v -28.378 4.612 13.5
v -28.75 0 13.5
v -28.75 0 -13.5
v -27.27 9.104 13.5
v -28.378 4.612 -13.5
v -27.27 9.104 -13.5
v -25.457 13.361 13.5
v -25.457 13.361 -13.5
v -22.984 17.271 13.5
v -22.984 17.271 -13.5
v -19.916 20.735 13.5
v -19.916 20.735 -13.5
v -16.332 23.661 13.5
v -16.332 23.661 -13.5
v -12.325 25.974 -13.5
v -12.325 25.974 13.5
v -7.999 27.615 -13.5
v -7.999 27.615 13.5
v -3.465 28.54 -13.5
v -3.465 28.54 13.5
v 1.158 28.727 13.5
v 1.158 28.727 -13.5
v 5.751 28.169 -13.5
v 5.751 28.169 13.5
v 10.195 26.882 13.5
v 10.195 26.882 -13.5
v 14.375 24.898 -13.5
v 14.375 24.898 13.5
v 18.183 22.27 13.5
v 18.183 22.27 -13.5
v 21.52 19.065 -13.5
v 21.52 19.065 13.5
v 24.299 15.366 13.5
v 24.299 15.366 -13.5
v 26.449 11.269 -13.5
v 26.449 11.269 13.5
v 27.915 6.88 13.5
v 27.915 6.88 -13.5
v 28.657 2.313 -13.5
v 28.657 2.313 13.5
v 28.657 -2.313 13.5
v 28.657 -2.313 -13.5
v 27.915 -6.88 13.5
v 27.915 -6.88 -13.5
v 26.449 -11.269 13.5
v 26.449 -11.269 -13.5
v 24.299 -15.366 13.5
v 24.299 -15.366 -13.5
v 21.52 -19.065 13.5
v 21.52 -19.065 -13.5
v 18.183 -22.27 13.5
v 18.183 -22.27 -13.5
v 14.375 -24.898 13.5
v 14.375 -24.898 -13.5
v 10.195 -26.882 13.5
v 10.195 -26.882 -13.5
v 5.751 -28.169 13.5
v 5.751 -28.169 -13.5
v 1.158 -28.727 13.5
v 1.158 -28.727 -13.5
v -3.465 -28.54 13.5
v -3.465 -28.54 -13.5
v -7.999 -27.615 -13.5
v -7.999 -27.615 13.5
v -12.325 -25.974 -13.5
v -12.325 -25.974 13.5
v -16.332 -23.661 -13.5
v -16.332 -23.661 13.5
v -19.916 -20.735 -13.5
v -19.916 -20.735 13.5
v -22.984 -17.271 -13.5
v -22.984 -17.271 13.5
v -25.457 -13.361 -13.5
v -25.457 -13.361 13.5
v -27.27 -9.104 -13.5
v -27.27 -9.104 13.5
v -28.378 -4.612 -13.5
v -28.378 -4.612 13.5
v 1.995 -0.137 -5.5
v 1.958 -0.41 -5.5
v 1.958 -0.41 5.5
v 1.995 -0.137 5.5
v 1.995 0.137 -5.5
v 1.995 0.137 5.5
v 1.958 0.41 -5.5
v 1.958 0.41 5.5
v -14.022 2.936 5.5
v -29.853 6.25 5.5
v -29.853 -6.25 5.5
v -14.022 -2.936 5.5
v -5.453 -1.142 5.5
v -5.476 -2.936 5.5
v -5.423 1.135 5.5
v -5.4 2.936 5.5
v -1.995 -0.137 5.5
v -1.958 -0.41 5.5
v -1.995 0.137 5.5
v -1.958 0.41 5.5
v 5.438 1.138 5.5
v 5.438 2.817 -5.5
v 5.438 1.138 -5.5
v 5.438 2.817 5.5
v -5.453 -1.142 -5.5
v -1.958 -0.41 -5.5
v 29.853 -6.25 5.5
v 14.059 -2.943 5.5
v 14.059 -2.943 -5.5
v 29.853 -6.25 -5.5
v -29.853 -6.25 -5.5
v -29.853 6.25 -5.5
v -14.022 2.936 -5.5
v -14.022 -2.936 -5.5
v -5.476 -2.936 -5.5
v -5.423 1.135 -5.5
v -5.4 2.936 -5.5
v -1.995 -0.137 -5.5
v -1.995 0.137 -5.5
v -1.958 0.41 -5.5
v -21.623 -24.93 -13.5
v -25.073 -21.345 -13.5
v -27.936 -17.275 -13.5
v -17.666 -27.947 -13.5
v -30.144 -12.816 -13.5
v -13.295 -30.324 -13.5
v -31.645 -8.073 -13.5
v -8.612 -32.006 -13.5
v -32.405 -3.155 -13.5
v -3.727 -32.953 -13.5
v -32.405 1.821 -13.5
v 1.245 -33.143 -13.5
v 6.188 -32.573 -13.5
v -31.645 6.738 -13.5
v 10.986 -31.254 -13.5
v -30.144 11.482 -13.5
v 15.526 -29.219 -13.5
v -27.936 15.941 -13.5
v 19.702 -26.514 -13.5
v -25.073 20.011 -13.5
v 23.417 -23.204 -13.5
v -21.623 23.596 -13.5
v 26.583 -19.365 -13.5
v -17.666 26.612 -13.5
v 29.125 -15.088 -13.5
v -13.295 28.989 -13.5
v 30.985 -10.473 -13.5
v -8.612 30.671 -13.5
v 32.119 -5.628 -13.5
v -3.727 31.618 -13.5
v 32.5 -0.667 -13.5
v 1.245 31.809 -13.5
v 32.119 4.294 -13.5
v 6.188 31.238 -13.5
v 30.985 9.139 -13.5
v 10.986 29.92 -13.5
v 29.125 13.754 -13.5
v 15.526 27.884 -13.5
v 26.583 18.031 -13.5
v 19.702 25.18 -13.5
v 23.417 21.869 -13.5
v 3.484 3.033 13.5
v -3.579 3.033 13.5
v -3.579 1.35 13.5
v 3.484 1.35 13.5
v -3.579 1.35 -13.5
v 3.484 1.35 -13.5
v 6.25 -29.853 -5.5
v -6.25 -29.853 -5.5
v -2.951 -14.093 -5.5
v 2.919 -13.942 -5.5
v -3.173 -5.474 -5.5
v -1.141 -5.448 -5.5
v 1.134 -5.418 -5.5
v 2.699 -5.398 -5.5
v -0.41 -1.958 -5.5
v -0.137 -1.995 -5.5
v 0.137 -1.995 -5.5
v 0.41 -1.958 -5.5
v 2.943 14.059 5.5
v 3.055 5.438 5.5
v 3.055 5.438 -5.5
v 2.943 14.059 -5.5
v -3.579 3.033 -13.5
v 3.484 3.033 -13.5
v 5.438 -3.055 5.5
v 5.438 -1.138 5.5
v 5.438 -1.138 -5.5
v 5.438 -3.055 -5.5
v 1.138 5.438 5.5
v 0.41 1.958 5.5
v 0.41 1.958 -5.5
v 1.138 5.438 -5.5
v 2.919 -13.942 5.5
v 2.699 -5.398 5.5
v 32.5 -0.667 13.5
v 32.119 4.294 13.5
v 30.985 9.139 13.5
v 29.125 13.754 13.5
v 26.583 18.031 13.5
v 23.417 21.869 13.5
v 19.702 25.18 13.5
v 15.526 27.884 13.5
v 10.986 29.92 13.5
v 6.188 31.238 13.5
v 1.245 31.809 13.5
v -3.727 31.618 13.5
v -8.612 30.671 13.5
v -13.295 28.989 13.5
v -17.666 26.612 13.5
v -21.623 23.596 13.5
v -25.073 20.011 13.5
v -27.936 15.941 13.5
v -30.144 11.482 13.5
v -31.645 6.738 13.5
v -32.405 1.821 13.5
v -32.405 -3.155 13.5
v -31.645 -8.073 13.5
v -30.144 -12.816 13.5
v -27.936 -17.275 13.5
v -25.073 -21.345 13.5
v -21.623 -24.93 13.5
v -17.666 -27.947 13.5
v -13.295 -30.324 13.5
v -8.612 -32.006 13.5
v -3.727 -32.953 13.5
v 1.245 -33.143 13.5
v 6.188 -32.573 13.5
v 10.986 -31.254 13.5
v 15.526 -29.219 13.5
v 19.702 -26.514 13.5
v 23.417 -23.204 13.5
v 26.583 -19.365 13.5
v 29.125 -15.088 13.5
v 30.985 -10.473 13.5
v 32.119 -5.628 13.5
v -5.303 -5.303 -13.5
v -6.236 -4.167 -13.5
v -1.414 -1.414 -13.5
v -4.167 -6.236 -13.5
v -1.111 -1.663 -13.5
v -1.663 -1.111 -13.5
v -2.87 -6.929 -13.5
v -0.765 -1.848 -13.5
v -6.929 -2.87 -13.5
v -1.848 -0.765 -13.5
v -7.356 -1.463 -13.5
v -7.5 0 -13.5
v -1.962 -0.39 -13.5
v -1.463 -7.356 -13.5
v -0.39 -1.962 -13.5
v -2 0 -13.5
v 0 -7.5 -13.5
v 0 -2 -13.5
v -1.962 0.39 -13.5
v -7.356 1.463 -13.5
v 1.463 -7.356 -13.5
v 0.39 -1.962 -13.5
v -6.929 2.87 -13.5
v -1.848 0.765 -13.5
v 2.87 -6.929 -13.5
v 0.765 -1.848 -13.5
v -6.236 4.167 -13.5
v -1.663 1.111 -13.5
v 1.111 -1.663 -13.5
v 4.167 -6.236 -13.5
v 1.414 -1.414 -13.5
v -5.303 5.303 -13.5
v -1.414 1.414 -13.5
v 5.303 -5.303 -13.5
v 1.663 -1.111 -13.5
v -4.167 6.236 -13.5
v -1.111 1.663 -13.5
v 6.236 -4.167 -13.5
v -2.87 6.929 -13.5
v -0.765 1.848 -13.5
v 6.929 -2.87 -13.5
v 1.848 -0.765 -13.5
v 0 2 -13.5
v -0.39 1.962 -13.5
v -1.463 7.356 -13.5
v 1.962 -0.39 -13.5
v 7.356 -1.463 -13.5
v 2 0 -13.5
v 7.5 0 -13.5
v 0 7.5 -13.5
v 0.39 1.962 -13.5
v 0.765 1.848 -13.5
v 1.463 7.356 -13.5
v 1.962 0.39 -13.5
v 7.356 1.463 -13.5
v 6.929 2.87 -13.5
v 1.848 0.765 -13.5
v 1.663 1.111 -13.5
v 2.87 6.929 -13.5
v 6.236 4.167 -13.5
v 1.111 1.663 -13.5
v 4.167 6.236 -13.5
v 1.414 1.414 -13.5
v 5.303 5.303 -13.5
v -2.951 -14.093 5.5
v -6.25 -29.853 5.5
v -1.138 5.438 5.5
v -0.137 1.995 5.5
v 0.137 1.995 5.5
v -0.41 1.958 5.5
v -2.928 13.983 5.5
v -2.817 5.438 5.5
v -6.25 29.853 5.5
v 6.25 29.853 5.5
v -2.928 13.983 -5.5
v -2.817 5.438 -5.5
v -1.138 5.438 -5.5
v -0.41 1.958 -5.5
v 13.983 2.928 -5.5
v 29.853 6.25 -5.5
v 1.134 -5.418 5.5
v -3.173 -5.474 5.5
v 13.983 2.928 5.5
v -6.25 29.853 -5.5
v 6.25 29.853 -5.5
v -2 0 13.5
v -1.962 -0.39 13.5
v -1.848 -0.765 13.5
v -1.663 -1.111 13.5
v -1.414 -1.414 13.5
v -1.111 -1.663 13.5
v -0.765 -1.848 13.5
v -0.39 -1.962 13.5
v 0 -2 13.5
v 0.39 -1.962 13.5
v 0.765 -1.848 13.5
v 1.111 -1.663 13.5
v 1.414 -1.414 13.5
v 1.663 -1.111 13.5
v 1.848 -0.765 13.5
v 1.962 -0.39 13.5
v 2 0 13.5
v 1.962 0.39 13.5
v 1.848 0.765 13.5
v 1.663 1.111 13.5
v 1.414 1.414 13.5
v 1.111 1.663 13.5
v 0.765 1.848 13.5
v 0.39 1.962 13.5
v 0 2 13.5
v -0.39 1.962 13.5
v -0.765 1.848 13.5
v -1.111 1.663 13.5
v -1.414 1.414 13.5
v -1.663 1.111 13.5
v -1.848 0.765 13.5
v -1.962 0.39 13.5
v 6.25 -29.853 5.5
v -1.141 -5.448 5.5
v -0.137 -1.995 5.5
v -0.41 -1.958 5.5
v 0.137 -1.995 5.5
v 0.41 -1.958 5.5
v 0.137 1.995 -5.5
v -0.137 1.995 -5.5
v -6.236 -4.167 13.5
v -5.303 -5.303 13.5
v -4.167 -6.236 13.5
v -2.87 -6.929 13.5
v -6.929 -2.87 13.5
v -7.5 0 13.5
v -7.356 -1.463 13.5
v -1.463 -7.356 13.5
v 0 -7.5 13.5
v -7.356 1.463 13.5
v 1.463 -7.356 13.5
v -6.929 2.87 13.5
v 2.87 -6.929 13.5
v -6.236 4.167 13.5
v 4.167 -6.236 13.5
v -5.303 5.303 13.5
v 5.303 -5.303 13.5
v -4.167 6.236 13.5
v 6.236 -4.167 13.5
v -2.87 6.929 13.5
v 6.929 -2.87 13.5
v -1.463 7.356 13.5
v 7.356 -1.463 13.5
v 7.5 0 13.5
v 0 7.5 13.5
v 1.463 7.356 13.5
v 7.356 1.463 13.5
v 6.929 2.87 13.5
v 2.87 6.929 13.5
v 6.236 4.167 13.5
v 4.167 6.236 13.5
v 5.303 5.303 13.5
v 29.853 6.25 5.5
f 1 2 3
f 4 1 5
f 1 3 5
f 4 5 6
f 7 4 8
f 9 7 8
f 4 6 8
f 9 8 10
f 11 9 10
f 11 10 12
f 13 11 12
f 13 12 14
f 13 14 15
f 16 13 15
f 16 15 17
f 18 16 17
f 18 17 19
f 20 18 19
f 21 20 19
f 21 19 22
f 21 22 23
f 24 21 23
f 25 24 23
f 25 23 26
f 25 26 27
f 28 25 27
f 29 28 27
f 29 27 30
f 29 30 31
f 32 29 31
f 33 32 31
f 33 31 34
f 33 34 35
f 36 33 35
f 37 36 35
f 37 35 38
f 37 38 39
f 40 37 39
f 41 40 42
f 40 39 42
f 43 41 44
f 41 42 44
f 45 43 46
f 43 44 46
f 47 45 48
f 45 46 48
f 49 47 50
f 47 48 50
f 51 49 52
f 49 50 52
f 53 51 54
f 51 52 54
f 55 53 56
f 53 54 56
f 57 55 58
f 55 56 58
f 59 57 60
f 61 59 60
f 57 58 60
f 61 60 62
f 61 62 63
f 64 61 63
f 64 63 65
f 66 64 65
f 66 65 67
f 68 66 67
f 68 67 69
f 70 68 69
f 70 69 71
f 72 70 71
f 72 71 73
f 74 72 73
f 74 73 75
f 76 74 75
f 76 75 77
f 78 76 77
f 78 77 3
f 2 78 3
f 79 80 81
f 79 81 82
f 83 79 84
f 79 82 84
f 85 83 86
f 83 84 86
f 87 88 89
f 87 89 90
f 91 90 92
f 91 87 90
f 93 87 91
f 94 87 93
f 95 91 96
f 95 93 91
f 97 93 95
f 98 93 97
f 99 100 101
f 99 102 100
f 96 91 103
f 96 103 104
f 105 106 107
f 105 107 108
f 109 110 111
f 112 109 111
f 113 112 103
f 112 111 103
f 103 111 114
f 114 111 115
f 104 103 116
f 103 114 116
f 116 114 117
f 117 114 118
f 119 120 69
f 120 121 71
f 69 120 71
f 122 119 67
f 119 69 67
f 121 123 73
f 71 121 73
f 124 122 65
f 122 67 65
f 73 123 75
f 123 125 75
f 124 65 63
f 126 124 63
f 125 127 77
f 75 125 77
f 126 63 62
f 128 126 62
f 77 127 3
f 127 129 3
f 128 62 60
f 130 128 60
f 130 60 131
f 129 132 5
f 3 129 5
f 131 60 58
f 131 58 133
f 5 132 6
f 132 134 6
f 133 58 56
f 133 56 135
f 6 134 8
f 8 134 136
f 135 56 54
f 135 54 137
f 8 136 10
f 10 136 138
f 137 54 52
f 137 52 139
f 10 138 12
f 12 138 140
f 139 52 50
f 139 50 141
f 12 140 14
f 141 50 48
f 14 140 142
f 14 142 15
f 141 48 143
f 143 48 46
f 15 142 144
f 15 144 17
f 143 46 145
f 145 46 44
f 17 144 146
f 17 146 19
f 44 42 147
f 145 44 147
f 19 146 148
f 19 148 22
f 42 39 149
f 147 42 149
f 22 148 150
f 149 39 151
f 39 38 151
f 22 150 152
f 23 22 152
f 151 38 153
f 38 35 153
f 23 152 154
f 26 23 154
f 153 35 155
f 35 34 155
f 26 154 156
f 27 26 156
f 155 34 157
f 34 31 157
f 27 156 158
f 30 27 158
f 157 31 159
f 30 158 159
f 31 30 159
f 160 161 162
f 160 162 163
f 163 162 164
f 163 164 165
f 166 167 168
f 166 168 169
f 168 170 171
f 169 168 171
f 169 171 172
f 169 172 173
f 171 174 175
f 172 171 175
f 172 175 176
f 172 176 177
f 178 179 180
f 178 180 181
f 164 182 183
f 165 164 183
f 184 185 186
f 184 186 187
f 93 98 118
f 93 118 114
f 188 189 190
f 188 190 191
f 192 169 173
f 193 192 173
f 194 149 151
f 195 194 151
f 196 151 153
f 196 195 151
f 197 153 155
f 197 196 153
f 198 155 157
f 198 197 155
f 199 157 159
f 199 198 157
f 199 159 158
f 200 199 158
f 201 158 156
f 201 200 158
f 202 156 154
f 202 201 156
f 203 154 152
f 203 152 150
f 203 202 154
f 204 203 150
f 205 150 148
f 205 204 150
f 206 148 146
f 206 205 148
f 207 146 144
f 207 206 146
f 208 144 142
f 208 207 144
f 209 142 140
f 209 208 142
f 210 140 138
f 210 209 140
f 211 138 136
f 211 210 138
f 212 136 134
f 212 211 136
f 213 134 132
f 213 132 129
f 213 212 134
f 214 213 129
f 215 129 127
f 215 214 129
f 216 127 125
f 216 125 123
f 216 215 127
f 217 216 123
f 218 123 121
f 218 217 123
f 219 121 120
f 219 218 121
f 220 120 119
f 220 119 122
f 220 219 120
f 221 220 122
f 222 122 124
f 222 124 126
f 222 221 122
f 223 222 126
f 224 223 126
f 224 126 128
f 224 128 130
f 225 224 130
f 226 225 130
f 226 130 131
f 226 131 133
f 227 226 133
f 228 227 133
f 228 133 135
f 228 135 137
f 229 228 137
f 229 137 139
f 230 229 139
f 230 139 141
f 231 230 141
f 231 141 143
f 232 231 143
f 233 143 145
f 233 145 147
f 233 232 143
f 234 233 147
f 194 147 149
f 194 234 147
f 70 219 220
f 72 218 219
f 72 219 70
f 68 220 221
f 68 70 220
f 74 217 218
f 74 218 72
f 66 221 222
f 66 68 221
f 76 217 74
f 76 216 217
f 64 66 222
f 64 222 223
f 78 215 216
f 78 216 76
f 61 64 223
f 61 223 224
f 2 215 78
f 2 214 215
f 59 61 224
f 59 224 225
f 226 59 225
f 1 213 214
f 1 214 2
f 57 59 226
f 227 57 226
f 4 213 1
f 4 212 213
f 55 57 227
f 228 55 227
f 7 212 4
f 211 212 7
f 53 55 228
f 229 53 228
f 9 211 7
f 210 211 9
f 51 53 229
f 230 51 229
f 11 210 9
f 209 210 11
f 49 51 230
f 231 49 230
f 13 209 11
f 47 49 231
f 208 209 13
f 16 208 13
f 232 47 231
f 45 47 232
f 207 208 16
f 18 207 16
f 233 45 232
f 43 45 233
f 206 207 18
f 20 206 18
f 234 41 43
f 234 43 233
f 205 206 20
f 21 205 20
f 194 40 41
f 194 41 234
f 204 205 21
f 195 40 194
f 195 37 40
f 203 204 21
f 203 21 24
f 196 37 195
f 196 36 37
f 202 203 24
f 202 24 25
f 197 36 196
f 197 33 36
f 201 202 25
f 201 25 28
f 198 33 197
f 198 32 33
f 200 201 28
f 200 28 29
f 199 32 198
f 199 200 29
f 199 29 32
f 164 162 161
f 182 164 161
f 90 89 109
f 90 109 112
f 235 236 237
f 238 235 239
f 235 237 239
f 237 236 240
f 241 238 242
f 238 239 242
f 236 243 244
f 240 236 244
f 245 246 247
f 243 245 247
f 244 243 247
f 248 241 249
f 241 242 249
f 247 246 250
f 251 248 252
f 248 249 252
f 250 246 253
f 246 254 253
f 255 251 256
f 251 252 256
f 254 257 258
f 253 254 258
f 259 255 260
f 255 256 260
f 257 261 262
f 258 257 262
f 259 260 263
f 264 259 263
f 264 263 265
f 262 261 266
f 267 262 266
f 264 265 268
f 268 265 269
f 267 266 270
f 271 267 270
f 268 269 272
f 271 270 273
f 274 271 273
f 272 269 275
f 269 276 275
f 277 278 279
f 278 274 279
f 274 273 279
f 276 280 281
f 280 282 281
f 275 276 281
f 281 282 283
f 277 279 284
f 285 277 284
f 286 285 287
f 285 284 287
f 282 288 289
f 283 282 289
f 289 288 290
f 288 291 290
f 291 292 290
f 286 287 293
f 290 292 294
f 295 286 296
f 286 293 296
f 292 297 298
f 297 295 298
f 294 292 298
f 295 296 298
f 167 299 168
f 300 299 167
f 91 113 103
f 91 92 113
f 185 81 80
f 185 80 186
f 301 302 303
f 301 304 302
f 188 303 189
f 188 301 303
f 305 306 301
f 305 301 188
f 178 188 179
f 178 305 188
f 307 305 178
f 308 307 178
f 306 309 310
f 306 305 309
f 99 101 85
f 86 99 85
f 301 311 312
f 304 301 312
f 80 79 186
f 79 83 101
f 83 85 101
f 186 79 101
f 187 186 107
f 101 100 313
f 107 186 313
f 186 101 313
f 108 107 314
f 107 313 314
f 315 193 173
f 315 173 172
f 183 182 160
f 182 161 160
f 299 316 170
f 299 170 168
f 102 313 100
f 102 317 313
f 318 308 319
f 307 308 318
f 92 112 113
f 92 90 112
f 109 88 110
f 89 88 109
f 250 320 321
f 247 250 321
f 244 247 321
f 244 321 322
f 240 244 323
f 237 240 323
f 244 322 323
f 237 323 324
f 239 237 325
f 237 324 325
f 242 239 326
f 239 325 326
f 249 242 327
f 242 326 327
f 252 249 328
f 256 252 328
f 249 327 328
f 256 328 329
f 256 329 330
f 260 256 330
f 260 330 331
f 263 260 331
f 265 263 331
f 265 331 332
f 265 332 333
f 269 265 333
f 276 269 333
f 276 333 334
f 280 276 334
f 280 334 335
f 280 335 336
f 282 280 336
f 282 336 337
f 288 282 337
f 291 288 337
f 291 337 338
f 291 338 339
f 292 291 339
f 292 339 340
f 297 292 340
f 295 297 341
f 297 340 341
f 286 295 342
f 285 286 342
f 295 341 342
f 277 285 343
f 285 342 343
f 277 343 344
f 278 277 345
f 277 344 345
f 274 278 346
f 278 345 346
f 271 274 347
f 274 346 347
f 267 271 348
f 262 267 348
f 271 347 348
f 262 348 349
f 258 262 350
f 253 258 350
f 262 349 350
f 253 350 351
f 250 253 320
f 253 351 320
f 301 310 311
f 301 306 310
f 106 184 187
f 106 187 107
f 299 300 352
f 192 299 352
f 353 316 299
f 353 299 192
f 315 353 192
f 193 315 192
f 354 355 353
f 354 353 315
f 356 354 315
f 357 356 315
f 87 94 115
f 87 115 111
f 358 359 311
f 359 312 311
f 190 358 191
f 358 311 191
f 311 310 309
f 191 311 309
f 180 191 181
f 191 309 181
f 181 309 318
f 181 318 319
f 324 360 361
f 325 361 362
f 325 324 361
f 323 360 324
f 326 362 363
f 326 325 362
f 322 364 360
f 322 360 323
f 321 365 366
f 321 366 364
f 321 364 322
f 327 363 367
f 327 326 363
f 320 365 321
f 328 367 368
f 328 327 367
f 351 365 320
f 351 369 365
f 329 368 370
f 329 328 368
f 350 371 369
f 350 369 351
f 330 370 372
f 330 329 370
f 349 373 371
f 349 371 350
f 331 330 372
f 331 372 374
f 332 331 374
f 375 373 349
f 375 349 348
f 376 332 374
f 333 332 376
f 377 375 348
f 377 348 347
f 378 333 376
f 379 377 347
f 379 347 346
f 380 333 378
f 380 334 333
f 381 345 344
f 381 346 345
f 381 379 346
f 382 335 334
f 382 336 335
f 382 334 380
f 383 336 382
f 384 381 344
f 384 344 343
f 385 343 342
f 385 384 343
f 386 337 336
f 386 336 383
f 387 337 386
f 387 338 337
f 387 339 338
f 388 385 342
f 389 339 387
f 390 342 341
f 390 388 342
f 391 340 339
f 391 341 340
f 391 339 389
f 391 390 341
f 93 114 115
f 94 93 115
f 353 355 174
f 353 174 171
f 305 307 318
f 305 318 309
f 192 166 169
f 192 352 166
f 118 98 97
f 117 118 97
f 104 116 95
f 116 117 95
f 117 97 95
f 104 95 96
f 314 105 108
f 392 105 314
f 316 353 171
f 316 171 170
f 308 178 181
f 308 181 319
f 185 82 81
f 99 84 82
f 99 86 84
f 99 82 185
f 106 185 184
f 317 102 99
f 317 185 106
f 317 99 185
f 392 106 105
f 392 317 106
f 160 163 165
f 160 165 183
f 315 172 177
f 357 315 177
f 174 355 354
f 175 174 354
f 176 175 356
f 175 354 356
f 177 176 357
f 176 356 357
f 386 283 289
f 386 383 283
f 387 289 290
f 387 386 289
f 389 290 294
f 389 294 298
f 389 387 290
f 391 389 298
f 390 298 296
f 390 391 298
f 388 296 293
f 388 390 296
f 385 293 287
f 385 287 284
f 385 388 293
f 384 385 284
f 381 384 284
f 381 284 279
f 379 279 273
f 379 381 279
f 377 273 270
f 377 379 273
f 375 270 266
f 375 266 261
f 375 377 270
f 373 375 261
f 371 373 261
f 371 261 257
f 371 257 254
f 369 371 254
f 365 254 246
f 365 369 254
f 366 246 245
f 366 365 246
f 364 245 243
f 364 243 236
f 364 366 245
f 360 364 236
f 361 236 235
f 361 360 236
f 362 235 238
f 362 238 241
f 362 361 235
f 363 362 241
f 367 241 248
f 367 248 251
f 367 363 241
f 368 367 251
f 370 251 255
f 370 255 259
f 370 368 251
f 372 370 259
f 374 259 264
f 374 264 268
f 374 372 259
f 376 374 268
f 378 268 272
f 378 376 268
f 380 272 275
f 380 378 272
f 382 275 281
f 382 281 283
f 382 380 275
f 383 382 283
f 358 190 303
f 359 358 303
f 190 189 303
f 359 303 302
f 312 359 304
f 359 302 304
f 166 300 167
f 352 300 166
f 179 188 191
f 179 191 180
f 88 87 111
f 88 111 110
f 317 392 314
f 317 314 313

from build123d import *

# Parameters (mm, degrees)
F0_R      = 32.5
F1_DEPTH  = 13.5
F3_D      = 57.5
F4_R      = 7.5
F5_DEPTH  = 13.5
F7_DEPTH  = 5.5
F9_D      = 4
F9_2_D    = 4
F9_3_D    = 4
F9_4_D    = 4
F9_5_D    = 4
F10_W     = 7.0632050799
F10_H     = 1.6830373213
F11_DEPTH = 13.5


with BuildPart() as f1:
    # F0 (on Top) → F1 (new body, symmetric)
    with BuildSketch(Plane.XY):
        with Locations((0, -0.6672826035)):
            Circle(F0_R)
    extrude(amount=F1_DEPTH, both=True)

    # F3 (through all)
    with Locations(Plane.XY.offset(13.5)):
        with Locations((0, 0)):
            Hole(F3_D / 2)


with BuildPart() as f5:
    # F4 (on Top) → F5 (new body, symmetric)
    with BuildSketch(Plane.XY):
        Circle(F4_R)
    extrude(amount=F5_DEPTH, both=True)

    # F9 (through all)
    with Locations(Plane(origin=(0, 0, -13.5), x_dir=(1, 0, 0), z_dir=(0, 0, -1))):
        with Locations((0, 0)):
            Hole(F9_D / 2)


with BuildPart() as f7:
    # F6 (on Top) → F7 (new body, symmetric)
    with BuildSketch(Plane.XY):
        Polygon((-5.4526781901, -1.1415773441), (0, 0), (-5.4233162555, 1.1354301045), align=None)
        Polygon((-5.4758139886, -2.9357501771), (-5.4526781901, -1.1415773441), (-14.0224410071, -2.9357501771), align=None)
        Polygon((-14.0224410071, -2.9357501771), (-5.4526781901, -1.1415773441), (-5.4233162555, 1.1354301045), (-14.0224410071, 2.9357501771), align=None)
        Polygon((-14.0224410071, 2.9357501771), (-5.4233162555, 1.1354301045), (-5.4001011886, 2.9357501771), align=None)
        Polygon((-29.8527636912, -6.25), (-14.0224410071, -2.9357501771), (-14.0224410071, 2.9357501771), (-29.8527636912, 6.25), align=None)
    extrude(amount=F7_DEPTH, both=True)

    # F9#2 (through all)
    with Locations(Plane(origin=(0, 0, -13.5), x_dir=(1, 0, 0), z_dir=(0, 0, -1))):
        with Locations((0, 0)):
            Hole(F9_2_D / 2)


with BuildPart() as f7b:
    # F6 (on Top) → F7, piece 2 (new body, symmetric)
    with BuildSketch(Plane.XY):
        Polygon((-1.1384002799, 5.4375031268), (0, 0), (1.1384002799, 5.4375031268), align=None)
        Polygon((-1.1384002799, 5.4375031268), (1.1384002799, 5.4375031268), (2.9434306638, 14.0591264075), (-2.9275812765, 13.9834227253), align=None)
        Polygon((2.9434306638, 14.0591264075), (1.1384002799, 5.4375031268), (3.0546020659, 5.4375031268), align=None)
        Polygon((-2.8173879341, 5.4375031268), (-1.1384002799, 5.4375031268), (-2.9275812765, 13.9834227253), align=None)
        Polygon((-2.9275812765, 13.9834227253), (2.9434306638, 14.0591264075), (6.25, 29.8527636912), (-6.25, 29.8527636912), align=None)
    extrude(amount=F7_DEPTH, both=True)

    # F9#3 (through all)
    with Locations(Plane(origin=(0, 0, -13.5), x_dir=(1, 0, 0), z_dir=(0, 0, -1))):
        with Locations((0, 0)):
            Hole(F9_3_D / 2)


with BuildPart() as f7c:
    # F6 (on Top) → F7, piece 3 (new body, symmetric)
    with BuildSketch(Plane.XY):
        Polygon((5.4375031268, 1.1384002799), (0, 0), (5.4375031268, -1.1384002799), align=None)
        Polygon((5.4375031268, 1.1384002799), (5.4375031268, -1.1384002799), (14.0591264075, -2.9434306638), (13.9834227253, 2.9275812765), align=None)
        Polygon((14.0591264075, -2.9434306638), (5.4375031268, -1.1384002799), (5.4375031268, -3.0546020659), align=None)
        Polygon((5.4375031268, 2.8173879341), (5.4375031268, 1.1384002799), (13.9834227253, 2.9275812765), align=None)
        Polygon((13.9834227253, 2.9275812765), (14.0591264075, -2.9434306638), (29.8527636912, -6.25), (29.8527636912, 6.25), align=None)
    extrude(amount=F7_DEPTH, both=True)

    # F9#4 (through all)
    with Locations(Plane(origin=(0, 0, -13.5), x_dir=(1, 0, 0), z_dir=(0, 0, -1))):
        with Locations((0, 0)):
            Hole(F9_4_D / 2)


with BuildPart() as f7d:
    # F6 (on Top) → F7, piece 4 (new body, symmetric)
    with BuildSketch(Plane.XY):
        Polygon((-2.9506219909, -14.0934753658), (2.9189258512, -13.9420805869), (1.1344135947, -5.4184609555), (-1.1405551016, -5.4477955079), align=None)
        Polygon((1.1344135947, -5.4184609555), (2.9189258512, -13.9420805869), (2.6985536874, -5.3982921727), align=None)
        Polygon((6.25, -29.8527636912), (2.9189258512, -13.9420805869), (-2.9506219909, -14.0934753658), (-6.25, -29.8527636912), align=None)
        Polygon((-1.1405551016, -5.4477955079), (1.1344135947, -5.4184609555), (0, 0), align=None)
        Polygon((-3.1729482121, -5.4740021727), (-2.9506219909, -14.0934753658), (-1.1405551016, -5.4477955079), align=None)
    extrude(amount=F7_DEPTH, both=True)

    # F9#5 (through all)
    with Locations(Plane(origin=(0, 0, -13.5), x_dir=(1, 0, 0), z_dir=(0, 0, -1))):
        with Locations((0, 0)):
            Hole(F9_5_D / 2)


with BuildPart() as f11:
    # F10 (on Top) → F11 (new body, symmetric)
    with BuildSketch(Plane.XY):
        with Locations((-0.0477514695, 2.1915186606)):
            Rectangle(F10_W, F10_H)
    extrude(amount=F11_DEPTH, both=True)


solid = Compound([f1.part, f5.part, f7.part, f7b.part, f7c.part, f7d.part, f11.part])
